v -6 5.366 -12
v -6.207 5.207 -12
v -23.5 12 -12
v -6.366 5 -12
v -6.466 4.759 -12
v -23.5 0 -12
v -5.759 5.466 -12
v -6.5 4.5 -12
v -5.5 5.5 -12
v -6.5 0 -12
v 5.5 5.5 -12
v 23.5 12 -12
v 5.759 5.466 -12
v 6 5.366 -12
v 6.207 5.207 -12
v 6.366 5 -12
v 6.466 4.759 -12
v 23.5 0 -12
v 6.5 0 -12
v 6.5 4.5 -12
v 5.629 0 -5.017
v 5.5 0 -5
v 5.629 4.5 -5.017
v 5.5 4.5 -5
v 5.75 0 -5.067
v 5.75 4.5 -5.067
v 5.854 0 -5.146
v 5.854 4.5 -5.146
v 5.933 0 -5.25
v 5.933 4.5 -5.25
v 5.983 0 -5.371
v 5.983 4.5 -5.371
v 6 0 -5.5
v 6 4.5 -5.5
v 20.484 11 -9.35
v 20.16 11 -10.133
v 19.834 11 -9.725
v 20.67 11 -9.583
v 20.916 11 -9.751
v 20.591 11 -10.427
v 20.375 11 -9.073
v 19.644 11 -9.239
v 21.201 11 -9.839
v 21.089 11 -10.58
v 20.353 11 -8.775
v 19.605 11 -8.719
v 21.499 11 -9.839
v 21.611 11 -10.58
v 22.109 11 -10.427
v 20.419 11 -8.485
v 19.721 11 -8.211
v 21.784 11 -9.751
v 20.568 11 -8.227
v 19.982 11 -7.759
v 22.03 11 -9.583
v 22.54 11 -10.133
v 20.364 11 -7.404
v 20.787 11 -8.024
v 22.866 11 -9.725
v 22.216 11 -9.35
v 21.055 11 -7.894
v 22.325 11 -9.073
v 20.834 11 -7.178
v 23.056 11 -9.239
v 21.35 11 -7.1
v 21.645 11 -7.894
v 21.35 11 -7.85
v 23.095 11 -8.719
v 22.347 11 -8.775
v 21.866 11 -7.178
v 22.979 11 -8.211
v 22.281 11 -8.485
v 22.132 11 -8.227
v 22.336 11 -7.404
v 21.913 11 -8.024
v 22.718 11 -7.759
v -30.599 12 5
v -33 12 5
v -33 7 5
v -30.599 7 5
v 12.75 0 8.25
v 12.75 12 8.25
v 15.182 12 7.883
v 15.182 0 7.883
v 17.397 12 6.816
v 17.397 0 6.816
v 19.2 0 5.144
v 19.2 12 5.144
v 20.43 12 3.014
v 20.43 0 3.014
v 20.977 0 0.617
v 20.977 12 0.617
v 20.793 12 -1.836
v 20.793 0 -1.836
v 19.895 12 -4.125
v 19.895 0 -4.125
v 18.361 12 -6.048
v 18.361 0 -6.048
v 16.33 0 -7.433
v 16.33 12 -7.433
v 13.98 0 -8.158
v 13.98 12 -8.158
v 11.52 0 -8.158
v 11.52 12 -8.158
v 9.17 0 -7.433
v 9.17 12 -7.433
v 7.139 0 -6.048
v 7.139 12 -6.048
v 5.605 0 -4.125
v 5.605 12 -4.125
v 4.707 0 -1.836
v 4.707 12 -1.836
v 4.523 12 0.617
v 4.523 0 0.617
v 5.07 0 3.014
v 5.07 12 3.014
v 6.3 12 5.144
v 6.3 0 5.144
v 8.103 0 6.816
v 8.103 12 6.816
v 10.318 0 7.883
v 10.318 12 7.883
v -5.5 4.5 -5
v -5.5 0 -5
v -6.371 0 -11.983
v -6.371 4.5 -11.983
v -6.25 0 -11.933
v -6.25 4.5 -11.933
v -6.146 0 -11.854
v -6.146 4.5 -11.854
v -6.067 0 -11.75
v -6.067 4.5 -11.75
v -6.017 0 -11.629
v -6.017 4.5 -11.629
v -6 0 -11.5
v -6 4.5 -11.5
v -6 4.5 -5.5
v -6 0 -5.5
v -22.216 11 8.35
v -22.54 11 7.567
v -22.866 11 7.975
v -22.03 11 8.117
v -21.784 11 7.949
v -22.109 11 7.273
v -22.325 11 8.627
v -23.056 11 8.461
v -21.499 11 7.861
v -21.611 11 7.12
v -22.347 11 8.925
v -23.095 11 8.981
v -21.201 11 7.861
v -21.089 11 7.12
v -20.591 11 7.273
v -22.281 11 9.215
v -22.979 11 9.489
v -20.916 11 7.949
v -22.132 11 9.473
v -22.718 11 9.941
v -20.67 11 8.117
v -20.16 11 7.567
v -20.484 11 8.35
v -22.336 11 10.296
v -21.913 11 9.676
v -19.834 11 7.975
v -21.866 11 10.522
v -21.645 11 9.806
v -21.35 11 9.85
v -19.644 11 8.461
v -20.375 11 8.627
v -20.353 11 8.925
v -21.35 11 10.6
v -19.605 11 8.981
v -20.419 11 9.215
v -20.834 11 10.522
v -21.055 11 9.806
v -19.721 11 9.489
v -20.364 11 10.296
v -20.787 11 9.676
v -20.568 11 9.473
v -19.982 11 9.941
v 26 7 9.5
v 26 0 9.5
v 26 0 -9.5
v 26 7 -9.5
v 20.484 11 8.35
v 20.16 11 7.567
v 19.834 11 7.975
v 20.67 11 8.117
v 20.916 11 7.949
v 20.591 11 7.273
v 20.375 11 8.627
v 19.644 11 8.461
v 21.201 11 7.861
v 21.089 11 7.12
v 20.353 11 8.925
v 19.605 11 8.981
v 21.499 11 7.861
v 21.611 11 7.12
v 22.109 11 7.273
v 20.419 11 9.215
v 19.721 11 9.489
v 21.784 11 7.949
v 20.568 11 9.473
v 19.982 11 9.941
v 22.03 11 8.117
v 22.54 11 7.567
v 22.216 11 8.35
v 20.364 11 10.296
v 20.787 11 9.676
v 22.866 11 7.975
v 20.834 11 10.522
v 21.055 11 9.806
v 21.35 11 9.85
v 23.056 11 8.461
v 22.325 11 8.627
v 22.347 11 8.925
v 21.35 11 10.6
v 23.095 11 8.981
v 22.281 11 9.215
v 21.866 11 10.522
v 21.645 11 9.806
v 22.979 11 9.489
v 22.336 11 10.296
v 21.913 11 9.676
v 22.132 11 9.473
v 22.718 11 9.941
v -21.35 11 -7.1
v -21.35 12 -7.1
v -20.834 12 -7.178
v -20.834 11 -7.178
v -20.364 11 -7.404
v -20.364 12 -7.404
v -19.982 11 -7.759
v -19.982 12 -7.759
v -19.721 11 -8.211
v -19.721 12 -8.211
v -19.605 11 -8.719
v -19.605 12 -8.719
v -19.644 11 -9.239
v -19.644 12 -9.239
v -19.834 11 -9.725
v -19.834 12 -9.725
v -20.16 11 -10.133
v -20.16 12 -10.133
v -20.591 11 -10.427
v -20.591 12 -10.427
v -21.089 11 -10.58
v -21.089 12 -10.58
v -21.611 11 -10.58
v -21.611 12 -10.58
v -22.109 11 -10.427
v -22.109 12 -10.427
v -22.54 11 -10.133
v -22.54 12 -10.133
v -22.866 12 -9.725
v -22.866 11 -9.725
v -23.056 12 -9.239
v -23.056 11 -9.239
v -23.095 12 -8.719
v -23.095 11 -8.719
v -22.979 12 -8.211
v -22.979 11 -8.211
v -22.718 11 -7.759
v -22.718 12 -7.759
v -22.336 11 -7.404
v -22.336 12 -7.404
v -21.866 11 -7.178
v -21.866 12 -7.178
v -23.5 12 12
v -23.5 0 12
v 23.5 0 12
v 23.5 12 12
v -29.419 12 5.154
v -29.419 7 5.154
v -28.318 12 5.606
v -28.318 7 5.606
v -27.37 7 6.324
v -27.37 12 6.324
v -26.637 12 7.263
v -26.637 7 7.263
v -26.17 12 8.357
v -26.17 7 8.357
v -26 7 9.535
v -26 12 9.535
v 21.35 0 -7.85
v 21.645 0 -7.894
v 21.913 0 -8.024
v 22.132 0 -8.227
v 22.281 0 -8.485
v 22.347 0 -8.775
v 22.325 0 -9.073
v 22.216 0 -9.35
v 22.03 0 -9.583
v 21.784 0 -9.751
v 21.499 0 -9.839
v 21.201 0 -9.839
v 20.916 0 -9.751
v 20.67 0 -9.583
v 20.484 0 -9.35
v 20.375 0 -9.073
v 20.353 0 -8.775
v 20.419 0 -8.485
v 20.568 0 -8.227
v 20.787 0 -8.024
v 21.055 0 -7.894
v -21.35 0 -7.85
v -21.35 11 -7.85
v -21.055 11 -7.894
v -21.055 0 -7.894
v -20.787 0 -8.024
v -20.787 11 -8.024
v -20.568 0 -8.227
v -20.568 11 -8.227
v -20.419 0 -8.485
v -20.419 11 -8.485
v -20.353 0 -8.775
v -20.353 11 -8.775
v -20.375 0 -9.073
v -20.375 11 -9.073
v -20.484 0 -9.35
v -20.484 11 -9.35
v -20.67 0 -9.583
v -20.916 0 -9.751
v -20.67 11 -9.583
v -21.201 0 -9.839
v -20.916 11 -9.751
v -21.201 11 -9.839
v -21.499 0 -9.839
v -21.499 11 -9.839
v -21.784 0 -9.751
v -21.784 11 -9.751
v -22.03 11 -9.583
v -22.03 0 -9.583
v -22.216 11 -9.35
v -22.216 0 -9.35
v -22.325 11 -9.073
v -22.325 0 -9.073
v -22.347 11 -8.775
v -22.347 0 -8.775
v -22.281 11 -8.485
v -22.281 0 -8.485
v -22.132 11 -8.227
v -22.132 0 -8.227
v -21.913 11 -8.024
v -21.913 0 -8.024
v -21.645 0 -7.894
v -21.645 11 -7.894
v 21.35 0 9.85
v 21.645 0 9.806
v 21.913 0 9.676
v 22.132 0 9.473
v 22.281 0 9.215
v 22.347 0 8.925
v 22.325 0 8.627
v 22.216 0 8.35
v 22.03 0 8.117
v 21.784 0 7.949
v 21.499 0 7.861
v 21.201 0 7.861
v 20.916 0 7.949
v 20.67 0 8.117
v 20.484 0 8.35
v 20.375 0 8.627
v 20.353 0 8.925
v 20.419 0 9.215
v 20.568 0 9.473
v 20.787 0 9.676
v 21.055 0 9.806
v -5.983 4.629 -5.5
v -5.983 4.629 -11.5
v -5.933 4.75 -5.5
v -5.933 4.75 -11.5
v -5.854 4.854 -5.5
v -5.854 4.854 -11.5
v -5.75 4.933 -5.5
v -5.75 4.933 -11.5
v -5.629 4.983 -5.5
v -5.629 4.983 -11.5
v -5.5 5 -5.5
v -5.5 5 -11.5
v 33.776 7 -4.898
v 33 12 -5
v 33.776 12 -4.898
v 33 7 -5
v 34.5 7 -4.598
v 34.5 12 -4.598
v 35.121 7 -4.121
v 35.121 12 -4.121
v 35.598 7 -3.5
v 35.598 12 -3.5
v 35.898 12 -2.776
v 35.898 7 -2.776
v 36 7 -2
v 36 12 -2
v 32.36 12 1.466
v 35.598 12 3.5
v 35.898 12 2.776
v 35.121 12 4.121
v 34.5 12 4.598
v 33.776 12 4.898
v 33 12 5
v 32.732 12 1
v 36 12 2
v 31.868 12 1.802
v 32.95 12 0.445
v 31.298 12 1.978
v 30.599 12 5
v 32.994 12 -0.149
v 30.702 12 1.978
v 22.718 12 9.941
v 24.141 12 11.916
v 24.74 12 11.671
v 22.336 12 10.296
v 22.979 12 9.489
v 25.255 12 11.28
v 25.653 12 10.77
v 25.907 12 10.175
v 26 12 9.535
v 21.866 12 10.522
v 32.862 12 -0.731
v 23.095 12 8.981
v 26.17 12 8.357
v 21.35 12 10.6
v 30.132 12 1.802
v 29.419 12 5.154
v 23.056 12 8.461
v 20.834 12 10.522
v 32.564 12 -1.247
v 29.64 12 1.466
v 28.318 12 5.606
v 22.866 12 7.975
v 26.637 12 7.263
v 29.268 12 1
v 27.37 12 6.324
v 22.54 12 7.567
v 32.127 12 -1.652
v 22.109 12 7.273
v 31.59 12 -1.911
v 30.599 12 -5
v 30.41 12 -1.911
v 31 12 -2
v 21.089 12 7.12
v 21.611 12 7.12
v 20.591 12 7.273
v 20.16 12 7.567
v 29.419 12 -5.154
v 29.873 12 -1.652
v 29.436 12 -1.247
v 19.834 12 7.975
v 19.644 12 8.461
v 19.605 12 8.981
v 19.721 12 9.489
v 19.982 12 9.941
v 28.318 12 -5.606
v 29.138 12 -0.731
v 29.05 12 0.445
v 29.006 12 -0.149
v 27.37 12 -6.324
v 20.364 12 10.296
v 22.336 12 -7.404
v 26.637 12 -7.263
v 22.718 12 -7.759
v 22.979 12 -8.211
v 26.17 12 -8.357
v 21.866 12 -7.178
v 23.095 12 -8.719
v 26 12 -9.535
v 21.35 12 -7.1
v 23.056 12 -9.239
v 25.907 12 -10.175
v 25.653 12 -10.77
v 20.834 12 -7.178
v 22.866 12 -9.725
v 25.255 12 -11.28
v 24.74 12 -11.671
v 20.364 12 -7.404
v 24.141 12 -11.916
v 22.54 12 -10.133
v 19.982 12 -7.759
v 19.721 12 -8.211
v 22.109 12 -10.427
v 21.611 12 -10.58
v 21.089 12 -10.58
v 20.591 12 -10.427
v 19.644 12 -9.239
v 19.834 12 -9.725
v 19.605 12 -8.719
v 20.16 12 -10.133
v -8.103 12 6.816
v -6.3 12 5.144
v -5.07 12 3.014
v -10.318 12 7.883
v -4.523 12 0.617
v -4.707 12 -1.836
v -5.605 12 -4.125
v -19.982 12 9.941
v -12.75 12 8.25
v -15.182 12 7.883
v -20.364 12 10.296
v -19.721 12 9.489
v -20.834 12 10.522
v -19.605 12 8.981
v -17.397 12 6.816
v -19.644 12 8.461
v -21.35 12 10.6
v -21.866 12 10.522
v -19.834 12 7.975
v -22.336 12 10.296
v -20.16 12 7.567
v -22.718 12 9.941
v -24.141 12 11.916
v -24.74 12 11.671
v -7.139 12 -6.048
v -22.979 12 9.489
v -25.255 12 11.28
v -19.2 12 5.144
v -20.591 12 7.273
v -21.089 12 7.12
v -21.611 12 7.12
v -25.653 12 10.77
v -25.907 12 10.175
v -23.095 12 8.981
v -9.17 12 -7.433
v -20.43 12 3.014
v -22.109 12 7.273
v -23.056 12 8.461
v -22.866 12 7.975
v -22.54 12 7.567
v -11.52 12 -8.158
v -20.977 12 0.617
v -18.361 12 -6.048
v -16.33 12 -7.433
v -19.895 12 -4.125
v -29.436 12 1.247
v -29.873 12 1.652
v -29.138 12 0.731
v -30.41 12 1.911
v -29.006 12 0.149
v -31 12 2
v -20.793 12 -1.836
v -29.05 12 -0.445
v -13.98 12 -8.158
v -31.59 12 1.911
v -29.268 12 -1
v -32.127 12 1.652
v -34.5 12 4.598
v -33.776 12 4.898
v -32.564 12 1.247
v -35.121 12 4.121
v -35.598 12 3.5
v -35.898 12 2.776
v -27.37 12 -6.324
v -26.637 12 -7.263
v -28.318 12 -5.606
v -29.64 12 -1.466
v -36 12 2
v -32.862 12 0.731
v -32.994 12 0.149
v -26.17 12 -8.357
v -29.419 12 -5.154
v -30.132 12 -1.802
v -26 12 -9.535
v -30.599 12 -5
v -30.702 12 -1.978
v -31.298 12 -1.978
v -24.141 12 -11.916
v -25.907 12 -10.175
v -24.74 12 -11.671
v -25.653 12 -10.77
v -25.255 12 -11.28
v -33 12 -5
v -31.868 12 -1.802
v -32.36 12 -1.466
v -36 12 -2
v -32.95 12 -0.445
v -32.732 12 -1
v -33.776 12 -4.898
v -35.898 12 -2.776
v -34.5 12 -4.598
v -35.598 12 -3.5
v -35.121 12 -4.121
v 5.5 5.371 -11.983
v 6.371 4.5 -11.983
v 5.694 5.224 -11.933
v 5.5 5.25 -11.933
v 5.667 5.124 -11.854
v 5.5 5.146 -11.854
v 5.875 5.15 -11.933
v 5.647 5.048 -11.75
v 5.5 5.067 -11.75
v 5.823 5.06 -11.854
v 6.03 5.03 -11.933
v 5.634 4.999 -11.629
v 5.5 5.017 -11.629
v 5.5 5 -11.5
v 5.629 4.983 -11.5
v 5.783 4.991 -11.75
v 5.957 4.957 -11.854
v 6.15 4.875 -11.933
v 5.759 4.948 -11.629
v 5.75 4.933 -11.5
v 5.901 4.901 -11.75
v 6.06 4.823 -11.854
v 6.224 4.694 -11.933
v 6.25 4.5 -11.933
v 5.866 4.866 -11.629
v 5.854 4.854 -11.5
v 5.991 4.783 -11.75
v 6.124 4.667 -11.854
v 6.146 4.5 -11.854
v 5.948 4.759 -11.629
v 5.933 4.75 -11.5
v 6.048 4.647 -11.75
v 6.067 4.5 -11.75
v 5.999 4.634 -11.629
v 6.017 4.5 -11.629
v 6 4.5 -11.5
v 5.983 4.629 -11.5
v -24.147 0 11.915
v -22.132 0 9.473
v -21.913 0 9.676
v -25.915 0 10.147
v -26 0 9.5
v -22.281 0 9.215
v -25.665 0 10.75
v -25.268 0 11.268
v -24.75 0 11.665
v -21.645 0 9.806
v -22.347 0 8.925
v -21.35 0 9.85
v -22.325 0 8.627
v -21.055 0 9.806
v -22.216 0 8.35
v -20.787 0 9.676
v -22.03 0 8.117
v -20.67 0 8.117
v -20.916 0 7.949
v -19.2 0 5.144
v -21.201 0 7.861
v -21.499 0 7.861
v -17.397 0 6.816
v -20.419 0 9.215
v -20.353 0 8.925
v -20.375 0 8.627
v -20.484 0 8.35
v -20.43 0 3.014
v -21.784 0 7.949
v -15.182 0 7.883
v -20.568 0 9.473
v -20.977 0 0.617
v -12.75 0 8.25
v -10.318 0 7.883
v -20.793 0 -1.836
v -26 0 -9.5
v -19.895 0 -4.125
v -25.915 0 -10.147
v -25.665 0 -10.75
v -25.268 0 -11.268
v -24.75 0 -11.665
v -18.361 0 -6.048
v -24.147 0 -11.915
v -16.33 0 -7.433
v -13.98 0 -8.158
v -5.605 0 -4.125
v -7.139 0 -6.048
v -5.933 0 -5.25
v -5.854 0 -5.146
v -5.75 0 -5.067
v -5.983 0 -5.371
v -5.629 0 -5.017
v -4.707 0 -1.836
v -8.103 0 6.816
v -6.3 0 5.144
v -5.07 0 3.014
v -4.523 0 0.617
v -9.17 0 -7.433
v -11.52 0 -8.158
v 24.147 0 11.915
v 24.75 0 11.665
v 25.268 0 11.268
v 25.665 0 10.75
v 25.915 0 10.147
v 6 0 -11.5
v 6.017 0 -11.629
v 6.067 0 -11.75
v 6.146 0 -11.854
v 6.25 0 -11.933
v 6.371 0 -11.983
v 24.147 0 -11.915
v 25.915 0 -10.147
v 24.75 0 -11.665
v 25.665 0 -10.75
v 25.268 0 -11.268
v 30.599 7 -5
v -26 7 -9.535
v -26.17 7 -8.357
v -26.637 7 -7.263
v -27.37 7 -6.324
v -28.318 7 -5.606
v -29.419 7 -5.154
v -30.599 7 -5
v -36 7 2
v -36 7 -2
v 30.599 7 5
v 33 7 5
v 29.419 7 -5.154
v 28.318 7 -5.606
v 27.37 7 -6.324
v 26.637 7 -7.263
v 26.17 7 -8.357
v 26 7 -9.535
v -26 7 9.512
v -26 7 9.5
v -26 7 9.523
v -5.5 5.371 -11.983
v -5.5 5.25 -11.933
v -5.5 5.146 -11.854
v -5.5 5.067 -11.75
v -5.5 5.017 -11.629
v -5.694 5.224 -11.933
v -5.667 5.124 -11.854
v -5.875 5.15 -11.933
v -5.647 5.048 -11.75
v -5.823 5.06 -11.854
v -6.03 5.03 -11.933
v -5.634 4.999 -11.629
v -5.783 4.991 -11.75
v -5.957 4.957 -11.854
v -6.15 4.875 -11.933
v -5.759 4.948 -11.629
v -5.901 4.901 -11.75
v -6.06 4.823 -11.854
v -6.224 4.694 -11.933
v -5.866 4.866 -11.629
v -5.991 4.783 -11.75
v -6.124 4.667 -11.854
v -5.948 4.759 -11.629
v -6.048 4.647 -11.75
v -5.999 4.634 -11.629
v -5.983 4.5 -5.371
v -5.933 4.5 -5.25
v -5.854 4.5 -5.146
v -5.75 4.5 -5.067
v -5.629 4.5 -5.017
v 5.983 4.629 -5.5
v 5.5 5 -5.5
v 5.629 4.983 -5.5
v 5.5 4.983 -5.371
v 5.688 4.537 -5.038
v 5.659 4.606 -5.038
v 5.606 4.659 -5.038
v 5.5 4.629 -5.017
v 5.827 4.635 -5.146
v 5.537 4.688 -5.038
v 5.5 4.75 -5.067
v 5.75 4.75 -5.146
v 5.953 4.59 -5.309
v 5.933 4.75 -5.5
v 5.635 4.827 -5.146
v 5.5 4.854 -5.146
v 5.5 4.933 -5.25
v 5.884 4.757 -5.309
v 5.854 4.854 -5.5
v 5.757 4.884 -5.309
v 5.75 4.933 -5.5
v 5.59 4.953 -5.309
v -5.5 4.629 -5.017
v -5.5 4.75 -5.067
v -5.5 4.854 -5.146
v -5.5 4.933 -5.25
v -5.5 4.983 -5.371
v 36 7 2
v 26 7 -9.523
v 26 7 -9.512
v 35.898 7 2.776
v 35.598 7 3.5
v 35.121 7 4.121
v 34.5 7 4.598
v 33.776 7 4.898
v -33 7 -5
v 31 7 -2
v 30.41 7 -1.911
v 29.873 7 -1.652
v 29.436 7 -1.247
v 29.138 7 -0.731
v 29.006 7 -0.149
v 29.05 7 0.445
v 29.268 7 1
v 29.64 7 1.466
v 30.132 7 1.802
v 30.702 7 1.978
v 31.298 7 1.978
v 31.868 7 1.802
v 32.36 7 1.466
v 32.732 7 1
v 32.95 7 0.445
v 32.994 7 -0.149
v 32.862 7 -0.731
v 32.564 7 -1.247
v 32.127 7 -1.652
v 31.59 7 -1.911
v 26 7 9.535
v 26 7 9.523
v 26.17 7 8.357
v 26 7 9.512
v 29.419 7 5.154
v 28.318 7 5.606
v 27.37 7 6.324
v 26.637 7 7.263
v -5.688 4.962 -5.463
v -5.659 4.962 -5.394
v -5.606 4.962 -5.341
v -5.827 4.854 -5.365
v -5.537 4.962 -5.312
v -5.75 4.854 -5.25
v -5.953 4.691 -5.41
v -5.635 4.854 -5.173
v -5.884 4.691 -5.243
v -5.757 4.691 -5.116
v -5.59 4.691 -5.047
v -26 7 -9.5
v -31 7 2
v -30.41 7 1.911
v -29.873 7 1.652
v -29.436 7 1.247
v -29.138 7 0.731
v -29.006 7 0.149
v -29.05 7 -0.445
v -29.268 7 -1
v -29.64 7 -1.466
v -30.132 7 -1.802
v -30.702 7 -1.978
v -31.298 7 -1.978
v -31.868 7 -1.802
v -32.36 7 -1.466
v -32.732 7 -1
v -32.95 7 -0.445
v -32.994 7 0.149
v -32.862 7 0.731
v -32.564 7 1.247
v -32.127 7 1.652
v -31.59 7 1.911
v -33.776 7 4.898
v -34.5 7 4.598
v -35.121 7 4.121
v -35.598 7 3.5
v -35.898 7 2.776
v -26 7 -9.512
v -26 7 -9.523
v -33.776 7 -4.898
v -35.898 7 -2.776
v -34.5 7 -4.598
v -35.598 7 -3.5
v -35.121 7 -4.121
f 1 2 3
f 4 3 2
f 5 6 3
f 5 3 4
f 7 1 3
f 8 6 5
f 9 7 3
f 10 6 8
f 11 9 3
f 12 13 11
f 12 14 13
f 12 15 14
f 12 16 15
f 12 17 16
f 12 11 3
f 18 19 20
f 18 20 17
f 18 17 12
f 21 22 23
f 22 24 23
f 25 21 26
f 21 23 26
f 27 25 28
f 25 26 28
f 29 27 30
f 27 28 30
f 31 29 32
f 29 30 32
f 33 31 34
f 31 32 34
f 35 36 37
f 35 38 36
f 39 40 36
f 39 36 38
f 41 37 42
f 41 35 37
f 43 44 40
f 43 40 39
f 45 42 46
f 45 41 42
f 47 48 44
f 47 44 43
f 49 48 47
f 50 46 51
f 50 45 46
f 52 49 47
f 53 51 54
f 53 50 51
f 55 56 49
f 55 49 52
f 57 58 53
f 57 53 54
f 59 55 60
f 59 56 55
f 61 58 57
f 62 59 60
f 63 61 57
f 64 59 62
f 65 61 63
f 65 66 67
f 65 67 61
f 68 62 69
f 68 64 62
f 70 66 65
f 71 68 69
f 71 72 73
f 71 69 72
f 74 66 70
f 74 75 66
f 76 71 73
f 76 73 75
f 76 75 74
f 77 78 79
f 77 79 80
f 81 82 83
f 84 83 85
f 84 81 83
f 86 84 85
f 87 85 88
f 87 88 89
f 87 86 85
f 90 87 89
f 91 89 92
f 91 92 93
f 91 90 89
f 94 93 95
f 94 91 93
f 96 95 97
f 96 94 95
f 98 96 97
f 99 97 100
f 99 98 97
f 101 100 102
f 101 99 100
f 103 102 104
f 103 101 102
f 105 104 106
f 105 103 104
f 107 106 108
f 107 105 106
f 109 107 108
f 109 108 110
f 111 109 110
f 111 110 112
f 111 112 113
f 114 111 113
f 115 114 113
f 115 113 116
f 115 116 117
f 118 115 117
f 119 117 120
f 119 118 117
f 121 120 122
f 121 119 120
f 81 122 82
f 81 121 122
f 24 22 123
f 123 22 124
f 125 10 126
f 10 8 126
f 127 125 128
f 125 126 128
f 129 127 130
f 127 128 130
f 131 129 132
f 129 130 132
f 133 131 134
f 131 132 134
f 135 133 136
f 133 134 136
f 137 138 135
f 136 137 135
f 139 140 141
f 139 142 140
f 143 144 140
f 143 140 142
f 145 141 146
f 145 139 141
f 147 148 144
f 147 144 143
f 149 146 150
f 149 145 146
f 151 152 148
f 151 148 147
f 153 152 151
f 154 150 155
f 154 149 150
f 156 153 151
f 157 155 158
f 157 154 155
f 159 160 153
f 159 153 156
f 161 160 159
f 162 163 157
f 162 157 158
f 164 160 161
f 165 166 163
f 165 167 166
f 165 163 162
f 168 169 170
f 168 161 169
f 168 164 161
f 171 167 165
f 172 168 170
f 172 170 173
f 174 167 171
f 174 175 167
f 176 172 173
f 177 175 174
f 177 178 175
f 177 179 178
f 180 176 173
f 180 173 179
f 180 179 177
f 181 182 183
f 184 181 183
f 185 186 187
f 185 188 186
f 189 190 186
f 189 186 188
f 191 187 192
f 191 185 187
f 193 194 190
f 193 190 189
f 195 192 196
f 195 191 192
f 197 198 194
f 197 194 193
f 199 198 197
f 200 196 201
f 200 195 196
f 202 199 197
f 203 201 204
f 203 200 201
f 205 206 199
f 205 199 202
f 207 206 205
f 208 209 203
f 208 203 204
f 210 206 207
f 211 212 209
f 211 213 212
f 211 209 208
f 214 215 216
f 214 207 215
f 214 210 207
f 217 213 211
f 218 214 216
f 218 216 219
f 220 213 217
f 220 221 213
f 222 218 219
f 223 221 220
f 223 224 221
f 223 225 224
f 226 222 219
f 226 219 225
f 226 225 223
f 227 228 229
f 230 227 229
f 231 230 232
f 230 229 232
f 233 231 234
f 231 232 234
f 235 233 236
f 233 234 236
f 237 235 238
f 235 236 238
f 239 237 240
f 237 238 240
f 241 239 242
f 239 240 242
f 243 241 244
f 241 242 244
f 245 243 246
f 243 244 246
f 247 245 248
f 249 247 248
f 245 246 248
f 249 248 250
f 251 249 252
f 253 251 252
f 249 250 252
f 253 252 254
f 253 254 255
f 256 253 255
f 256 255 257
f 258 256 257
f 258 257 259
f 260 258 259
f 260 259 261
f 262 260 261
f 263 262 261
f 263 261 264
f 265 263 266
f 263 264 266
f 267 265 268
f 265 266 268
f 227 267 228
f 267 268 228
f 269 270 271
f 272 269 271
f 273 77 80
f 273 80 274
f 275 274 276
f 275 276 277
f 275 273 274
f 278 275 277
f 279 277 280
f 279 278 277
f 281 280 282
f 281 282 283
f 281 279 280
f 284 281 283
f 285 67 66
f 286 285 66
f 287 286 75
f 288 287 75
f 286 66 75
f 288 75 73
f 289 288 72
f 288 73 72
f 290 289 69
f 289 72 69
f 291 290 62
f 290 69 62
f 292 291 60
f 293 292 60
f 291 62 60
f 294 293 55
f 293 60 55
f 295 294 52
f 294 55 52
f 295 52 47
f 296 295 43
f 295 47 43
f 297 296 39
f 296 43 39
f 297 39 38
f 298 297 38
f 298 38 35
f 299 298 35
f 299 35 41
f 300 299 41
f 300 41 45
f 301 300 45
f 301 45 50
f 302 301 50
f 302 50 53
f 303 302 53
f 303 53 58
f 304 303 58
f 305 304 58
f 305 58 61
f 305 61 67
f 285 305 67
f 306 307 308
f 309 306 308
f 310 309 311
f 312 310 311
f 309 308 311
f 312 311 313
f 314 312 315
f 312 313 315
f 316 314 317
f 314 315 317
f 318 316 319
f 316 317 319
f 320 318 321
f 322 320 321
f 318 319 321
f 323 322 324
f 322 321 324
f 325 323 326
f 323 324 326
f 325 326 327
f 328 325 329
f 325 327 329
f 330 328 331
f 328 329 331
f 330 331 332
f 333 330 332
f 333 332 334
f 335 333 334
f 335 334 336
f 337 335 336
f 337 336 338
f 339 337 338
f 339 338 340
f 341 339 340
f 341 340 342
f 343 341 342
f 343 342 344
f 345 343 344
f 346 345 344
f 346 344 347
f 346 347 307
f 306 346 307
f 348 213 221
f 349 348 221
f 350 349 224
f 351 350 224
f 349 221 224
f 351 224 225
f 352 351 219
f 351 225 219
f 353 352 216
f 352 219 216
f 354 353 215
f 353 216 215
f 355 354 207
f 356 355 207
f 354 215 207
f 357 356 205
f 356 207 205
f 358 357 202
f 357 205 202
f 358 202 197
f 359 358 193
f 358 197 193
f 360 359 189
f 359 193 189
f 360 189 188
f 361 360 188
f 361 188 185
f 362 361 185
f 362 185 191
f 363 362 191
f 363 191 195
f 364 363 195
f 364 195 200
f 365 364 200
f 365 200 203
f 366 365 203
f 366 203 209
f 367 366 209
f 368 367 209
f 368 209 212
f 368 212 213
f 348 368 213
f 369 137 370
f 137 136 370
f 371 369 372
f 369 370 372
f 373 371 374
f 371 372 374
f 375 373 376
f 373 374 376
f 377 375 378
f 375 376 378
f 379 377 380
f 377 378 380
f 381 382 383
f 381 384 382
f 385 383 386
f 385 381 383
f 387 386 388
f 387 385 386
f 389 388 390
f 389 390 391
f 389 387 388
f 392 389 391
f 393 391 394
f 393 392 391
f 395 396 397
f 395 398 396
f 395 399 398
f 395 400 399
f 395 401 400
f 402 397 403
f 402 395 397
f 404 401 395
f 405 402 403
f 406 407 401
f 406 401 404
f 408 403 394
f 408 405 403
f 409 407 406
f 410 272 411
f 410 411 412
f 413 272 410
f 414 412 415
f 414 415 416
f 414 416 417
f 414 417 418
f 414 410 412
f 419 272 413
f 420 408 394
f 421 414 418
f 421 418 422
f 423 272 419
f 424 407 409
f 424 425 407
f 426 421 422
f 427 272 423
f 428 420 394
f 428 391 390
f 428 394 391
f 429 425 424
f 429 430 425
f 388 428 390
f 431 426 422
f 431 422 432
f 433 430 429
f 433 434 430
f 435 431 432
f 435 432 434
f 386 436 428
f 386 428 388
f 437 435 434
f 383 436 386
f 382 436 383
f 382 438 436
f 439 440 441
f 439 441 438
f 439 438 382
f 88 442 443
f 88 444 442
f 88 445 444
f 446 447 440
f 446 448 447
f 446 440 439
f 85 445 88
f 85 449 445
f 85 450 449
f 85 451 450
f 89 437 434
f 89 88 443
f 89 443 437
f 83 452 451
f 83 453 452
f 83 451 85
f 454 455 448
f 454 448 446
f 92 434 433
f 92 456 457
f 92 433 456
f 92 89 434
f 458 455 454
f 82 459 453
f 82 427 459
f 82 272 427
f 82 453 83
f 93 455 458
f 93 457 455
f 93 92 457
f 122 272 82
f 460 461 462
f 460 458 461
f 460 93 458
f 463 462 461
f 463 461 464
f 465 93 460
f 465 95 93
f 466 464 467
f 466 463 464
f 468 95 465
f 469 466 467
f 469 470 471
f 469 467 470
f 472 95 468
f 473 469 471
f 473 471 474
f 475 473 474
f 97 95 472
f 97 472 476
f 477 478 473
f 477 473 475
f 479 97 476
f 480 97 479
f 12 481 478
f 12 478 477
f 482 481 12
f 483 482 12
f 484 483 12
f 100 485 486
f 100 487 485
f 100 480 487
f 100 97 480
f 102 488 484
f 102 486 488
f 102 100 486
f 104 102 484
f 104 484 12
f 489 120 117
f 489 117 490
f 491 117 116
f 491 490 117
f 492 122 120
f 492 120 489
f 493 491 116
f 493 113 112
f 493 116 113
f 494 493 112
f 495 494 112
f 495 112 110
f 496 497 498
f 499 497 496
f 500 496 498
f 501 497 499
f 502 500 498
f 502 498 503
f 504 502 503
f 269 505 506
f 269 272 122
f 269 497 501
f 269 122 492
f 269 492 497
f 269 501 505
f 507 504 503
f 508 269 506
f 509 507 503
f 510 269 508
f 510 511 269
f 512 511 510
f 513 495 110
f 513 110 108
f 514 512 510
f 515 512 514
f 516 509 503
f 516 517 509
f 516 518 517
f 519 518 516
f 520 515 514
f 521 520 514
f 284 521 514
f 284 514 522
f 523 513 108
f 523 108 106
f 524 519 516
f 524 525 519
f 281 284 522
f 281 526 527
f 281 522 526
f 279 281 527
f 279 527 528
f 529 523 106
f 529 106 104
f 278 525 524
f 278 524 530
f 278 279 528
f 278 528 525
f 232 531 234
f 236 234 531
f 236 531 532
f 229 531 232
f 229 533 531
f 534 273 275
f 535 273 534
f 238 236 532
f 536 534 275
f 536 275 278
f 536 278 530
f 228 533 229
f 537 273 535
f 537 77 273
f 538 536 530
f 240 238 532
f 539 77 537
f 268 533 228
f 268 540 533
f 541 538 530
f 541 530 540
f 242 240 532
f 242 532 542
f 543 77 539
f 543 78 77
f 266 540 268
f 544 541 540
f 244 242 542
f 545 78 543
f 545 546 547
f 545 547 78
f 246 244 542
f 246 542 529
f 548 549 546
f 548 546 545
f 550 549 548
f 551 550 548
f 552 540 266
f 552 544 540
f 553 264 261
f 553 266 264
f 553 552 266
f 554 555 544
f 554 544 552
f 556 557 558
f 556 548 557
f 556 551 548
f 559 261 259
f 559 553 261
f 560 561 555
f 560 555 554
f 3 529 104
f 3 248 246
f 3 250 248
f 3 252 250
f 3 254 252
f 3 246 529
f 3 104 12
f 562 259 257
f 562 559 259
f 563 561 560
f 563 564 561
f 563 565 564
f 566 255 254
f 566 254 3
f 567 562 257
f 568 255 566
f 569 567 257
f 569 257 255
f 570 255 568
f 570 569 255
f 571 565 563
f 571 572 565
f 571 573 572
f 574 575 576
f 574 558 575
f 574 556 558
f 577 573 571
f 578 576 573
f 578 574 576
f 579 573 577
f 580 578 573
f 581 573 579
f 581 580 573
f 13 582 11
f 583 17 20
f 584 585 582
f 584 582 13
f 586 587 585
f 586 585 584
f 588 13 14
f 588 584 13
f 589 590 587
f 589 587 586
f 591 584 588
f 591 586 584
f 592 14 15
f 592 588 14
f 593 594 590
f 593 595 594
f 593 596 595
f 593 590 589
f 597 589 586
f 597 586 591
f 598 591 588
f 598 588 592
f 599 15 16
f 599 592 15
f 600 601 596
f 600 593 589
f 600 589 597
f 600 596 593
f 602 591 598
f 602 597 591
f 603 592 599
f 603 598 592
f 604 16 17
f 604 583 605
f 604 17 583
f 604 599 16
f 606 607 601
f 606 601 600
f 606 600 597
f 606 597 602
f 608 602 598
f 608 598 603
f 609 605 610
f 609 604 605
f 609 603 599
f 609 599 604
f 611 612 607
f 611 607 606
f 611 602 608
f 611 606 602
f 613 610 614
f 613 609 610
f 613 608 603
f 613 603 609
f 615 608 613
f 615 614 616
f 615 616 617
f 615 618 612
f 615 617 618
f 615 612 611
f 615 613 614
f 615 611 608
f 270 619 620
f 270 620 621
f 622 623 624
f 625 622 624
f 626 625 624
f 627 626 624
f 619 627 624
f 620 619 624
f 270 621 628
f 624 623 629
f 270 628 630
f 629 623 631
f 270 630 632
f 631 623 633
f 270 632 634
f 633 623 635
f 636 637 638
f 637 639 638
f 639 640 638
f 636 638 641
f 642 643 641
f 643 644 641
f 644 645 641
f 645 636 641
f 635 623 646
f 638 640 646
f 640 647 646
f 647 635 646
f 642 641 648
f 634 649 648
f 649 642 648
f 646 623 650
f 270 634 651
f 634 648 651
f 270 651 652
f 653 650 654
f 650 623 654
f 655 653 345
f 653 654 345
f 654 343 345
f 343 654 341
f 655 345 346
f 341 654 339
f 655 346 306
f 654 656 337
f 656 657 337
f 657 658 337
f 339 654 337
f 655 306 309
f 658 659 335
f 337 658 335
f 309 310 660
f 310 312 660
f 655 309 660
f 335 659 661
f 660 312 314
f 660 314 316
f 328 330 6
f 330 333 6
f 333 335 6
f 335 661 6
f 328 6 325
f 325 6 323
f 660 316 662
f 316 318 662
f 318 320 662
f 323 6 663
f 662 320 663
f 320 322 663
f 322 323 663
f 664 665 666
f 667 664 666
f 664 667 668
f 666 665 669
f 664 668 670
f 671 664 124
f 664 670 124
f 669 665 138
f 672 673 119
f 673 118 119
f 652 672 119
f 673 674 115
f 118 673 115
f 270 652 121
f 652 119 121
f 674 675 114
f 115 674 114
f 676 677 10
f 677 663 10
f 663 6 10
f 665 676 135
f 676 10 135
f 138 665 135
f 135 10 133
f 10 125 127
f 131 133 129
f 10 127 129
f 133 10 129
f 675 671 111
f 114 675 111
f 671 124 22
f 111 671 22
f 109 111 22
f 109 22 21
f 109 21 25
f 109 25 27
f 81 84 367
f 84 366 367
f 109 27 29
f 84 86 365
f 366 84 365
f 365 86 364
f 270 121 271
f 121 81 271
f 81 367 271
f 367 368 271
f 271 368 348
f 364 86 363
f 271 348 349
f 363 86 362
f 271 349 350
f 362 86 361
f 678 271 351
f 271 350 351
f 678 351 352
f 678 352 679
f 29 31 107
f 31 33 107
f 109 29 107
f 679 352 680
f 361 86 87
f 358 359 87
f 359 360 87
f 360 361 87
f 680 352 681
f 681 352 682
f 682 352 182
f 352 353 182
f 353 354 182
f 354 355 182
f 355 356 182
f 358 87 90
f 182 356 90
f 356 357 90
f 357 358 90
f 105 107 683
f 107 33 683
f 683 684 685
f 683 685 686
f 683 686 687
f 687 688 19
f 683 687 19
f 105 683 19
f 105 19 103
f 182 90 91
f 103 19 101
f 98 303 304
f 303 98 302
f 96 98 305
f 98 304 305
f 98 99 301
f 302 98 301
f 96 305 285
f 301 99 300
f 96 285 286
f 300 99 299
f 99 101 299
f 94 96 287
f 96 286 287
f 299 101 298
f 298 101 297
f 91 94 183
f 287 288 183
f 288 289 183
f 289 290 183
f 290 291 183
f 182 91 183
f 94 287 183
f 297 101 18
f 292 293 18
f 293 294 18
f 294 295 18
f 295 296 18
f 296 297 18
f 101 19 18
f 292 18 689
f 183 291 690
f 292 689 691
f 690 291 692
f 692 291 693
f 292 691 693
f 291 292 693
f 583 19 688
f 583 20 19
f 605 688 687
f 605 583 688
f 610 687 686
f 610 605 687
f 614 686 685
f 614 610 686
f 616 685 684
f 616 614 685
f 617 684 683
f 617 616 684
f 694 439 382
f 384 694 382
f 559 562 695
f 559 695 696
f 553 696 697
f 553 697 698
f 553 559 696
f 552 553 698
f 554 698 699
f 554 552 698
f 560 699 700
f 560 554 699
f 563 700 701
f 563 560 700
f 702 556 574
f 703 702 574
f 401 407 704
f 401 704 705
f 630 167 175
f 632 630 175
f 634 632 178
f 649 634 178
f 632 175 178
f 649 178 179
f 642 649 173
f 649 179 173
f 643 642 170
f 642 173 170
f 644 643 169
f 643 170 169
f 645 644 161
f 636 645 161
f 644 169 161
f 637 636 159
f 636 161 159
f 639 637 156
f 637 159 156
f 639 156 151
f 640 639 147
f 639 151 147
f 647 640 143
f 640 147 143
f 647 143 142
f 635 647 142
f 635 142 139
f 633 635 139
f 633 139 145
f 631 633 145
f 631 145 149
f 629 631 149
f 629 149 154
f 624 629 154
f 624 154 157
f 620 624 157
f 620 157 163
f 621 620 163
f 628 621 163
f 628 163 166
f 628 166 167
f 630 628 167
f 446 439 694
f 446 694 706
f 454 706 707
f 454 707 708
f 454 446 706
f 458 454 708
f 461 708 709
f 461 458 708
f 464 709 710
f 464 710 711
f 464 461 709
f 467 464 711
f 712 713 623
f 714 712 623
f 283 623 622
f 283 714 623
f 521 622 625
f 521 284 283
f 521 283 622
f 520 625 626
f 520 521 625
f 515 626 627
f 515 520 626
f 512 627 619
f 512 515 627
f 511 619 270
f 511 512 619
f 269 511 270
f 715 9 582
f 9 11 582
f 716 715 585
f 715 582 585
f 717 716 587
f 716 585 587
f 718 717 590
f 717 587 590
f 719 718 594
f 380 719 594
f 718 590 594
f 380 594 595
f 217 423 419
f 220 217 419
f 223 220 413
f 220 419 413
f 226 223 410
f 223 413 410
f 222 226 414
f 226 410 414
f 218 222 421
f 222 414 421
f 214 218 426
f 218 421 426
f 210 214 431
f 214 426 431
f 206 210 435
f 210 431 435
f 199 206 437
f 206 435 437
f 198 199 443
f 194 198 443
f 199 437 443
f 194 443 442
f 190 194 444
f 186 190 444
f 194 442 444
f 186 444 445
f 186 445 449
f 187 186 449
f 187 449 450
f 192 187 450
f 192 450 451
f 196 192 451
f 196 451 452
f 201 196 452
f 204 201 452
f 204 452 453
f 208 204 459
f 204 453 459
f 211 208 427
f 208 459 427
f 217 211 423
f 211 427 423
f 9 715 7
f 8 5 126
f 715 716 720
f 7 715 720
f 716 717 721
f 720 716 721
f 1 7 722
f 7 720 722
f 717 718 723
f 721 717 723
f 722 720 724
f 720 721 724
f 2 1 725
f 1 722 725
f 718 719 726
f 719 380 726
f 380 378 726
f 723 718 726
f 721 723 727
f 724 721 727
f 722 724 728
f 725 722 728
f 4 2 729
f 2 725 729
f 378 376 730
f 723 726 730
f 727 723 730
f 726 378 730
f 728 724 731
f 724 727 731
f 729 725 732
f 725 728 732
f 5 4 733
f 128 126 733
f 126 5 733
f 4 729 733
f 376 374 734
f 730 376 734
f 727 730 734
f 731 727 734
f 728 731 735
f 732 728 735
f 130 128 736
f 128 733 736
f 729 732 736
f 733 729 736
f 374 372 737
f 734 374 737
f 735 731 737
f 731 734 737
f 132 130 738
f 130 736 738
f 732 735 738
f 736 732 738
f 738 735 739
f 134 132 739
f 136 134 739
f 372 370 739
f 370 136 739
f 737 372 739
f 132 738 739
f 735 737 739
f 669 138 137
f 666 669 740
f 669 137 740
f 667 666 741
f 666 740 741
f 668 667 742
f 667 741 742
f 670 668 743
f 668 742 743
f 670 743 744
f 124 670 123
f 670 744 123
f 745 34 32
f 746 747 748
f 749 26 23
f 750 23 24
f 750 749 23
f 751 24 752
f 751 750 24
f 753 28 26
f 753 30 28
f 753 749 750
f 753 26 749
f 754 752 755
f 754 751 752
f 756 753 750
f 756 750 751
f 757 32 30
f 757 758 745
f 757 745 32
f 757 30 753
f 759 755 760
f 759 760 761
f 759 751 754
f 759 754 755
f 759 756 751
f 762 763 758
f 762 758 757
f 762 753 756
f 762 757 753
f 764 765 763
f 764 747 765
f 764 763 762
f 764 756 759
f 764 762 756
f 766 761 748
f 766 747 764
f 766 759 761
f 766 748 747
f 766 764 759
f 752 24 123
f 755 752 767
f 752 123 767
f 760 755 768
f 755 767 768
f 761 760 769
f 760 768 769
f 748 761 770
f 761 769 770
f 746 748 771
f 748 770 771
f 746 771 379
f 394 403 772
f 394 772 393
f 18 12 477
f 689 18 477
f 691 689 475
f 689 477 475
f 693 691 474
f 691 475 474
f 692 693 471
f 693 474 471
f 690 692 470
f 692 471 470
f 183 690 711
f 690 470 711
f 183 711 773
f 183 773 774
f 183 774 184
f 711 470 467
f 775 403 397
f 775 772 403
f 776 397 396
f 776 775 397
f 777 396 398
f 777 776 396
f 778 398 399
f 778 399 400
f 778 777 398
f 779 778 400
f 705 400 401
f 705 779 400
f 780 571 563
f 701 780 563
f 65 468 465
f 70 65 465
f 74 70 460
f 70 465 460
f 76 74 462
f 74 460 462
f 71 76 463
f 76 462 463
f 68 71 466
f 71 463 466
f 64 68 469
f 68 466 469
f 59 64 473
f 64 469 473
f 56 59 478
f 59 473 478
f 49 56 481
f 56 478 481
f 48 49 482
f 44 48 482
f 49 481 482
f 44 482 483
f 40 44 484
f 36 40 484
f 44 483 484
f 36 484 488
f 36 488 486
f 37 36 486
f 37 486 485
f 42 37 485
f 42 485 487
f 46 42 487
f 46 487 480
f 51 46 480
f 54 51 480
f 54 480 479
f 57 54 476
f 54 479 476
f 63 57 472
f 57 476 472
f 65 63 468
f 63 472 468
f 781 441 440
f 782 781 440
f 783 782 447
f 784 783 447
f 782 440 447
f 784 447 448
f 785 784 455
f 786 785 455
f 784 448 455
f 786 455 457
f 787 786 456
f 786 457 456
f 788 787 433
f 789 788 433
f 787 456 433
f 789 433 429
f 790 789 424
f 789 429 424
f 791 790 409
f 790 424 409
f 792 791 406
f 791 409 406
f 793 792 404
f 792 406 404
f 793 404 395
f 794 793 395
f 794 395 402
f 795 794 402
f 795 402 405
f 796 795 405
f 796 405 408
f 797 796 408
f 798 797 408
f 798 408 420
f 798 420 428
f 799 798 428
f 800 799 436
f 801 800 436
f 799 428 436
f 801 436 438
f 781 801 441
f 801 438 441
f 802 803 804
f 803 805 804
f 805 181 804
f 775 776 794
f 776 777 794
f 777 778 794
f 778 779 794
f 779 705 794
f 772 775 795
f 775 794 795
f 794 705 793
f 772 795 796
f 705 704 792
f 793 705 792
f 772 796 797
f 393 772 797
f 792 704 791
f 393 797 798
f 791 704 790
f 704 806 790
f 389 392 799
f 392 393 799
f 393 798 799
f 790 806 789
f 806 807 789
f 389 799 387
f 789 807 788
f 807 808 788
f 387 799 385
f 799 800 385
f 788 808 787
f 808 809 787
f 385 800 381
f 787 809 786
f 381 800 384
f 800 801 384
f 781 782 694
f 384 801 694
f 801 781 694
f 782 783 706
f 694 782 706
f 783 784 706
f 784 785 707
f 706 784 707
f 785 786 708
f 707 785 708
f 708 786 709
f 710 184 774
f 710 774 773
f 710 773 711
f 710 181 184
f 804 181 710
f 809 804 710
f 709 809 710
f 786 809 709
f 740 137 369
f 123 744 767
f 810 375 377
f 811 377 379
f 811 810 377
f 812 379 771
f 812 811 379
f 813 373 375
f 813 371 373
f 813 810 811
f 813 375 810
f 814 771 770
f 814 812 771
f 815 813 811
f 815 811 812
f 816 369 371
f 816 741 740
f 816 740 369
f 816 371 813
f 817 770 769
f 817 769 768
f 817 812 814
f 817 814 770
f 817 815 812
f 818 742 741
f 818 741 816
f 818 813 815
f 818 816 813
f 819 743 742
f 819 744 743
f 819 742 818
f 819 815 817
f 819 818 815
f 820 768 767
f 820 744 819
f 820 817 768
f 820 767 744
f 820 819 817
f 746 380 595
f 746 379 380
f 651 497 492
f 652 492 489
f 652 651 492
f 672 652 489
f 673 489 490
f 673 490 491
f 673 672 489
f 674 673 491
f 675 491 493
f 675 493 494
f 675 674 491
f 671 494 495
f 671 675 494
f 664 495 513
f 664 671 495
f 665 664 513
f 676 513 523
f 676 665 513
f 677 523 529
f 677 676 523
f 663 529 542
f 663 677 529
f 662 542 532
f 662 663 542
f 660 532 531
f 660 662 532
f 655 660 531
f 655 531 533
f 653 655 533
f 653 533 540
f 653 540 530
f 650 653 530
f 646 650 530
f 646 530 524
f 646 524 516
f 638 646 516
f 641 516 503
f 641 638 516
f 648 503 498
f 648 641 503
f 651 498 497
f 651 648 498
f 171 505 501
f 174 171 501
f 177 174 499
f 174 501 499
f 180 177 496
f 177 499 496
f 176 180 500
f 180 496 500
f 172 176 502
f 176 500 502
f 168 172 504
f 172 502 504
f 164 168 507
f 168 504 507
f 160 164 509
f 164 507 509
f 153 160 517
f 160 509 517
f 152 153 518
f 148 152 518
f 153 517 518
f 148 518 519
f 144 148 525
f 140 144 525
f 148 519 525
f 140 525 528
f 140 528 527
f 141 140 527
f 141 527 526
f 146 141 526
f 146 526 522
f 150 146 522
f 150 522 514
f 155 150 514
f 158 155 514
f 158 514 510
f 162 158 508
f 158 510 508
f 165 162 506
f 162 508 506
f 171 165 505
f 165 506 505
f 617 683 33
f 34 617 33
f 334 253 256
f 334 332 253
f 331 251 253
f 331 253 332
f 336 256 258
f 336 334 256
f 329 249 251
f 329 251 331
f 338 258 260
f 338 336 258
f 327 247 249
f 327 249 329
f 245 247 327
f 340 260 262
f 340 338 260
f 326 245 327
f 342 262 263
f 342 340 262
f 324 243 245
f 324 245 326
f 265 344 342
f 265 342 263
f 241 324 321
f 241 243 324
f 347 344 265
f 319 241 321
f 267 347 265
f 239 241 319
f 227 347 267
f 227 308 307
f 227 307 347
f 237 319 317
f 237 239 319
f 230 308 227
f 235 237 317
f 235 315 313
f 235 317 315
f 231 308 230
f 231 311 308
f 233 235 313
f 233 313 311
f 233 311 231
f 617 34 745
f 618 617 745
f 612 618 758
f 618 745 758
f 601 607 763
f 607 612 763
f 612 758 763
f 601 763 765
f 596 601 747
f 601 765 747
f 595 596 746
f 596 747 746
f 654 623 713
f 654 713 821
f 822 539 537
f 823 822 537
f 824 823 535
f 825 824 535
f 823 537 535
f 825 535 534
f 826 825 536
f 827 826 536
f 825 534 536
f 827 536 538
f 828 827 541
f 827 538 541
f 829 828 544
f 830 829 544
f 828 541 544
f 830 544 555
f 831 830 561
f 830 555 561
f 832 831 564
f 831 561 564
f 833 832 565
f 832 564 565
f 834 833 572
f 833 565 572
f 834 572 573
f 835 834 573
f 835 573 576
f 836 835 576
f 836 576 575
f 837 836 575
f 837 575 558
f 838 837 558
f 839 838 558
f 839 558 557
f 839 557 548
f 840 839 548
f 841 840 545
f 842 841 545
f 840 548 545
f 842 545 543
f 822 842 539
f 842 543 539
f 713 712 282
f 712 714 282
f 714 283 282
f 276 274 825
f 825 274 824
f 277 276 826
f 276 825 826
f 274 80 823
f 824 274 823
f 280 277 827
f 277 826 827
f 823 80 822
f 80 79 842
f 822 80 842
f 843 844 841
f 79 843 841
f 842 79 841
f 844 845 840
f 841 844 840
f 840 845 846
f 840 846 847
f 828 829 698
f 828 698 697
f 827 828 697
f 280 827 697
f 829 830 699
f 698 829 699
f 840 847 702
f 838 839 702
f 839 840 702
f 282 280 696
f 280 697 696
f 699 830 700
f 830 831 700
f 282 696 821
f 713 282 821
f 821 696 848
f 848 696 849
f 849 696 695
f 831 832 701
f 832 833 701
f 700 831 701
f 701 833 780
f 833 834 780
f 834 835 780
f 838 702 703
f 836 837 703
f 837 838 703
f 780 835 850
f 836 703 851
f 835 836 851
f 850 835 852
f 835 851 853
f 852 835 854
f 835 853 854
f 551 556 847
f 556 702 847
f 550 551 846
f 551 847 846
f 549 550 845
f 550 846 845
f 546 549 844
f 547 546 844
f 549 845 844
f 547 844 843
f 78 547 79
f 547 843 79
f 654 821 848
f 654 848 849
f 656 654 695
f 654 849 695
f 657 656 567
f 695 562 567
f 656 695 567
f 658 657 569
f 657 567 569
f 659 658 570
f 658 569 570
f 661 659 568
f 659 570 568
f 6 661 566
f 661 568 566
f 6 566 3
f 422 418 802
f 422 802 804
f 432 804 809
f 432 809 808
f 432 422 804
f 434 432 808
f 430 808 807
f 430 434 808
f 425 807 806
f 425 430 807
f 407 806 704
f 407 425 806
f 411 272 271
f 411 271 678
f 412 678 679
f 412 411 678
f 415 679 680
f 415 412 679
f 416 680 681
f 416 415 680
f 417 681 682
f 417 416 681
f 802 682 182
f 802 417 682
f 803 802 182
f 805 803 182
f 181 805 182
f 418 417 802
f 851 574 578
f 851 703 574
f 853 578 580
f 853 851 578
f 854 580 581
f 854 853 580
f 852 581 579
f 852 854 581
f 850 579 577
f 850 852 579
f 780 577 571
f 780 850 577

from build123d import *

# Parameters (mm, degrees)
SKETCH1_W           = 52
SKETCH1_H           = 24
SKETCH1_R           = 8.25
BOSS_EXTRUDE1_DEPTH = 12
SKETCH2_R           = 1
CUT_EXTRUDE1_DEPTH  = 32.048349393
SKETCH3_R           = 1.75
CUT_EXTRUDE2_DEPTH  = 1
FILLET1_R           = 2.5
CUT_EXTRUDE3_DEPTH  = 5
FILLET2_R           = 0.5
SKETCH6_W           = 10
SKETCH6_H           = 10
SKETCH6_R           = 2
BOSS_EXTRUDE2_DEPTH = 5
FILLET3_R           = 4.6
FILLET4_R           = 3


with BuildPart() as part:
    # Sketch1 → Boss-Extrude1 (new body)
    with BuildSketch(Plane(origin=(0, 0, 0), x_dir=(1, 0, 0), z_dir=(0, 1, 0))):
        Rectangle(SKETCH1_W, SKETCH1_H)
        with Locations(Location((12.75, 0, 0), (0, 0, 270))):
            Circle(SKETCH1_R, mode=Mode.SUBTRACT)
        with Locations(Location((-12.75, 0, 0), (0, 0, 270))):
            Circle(SKETCH1_R, mode=Mode.SUBTRACT)
    extrude(amount=BOSS_EXTRUDE1_DEPTH)

    # Sketch2 → Cut-Extrude1 (cut, through all)
    with BuildSketch(Plane(origin=(0, 12, 0), x_dir=(1, 0, 0), z_dir=(0, 1, 0))):
        with Locations(Location((-21.35, 8.85, 0), (0, 0, 270))):
            Circle(SKETCH2_R)
        with Locations(Location((21.35, 8.85, 0), (0, 0, 270))):
            Circle(SKETCH2_R)
        with Locations(Location((21.35, -8.85, 0), (0, 0, 270))):
            Circle(SKETCH2_R)
        with Locations(Location((-21.35, -8.85, 0), (0, 0, 270))):
            Circle(SKETCH2_R)
    extrude(amount=-CUT_EXTRUDE1_DEPTH, mode=Mode.SUBTRACT)

    # Sketch3 → Cut-Extrude2 (cut)
    with BuildSketch(Plane(origin=(0, 12, 0), x_dir=(1, 0, 0), z_dir=(0, 1, 0))):
        with Locations(Location((-21.35, 8.85, 0), (0, 0, 270))):
            Circle(SKETCH3_R)
        with Locations(Location((21.35, 8.85, 0), (0, 0, 270))):
            Circle(SKETCH3_R)
        with Locations(Location((21.35, -8.85, 0), (0, 0, 270))):
            Circle(SKETCH3_R)
        with Locations(Location((-21.35, -8.85, 0), (0, 0, 270))):
            Circle(SKETCH3_R)
    extrude(amount=-CUT_EXTRUDE2_DEPTH, mode=Mode.SUBTRACT)

    # Fillet1
    fillet1_edges = [part.edges().sort_by_distance(p)[0] for p in [
        (26, 6, 12),
        (-26, 6, 12),
        (-26, 6, -12),
        (26, 6, -12),
    ]]
    fillet(fillet1_edges, radius=FILLET1_R)

    # Sketch4 → Cut-Extrude3 (cut)
    with BuildSketch(Plane.XZ):
        Polygon((-6, -5), (-6, -12), (6, -12), (6, -5), (0, -5), align=None)
    extrude(amount=-CUT_EXTRUDE3_DEPTH, mode=Mode.SUBTRACT)

    # Fillet2
    fillet2_edges = [part.edges().sort_by_distance(p)[0] for p in [
        (0, 5, -12),
        (6, 2.5, -12),
        (-6, 2.5, -12),
        (-6, 2.5, -5),
        (6, 5, -8.5),
        (6, 2.5, -5),
        (-6, 5, -8.5),
        (0, 5, -5),
    ]]
    fillet(fillet2_edges, radius=FILLET2_R)

    # Sketch6 → Boss-Extrude2 (add)
    # profile 1 of 2: a face of its own
    with BuildSketch(Plane(origin=(0, 12, 0), x_dir=(1, 0, 0), z_dir=(0, 1, 0))):
        with Locations((-31, 0)):
            Rectangle(SKETCH6_W, SKETCH6_H)
        with Locations(Location((-31, 0, 0), (0, 0, 270))):
            Circle(SKETCH6_R, mode=Mode.SUBTRACT)
    # profile 2 of 2: a face of its own
    with BuildSketch(Plane(origin=(0, 12, 0), x_dir=(1, 0, 0), z_dir=(0, 1, 0))):
        with Locations((31, 0)):
            Rectangle(SKETCH6_W, SKETCH6_H)
        with Locations(Location((31, 0, 0), (0, 0, 90))):
            Circle(SKETCH6_R, mode=Mode.SUBTRACT)
    extrude(amount=-BOSS_EXTRUDE2_DEPTH)

    # Fillet3
    # the kernel refuses this fillet: 4.6 mm, written as the material it adds along each edge
    with BuildSketch(Plane(origin=(26, 12, 5), x_dir=(-5.467859312132584e-05, 0, 0.9999999985051258), z_dir=(0, -1, 0)), Plane(origin=(-26, 12, -5), x_dir=(5.467859312132586e-05, 0, -0.9999999985051258), z_dir=(0, -1, 0))) as fillet3_piece_1:
        with BuildLine():
            CenterArc((4.59974851, -4.599547254), FILLET3_R, 90.80387664, 89.192990507)
            Line((-0.000251483, -4.599295733), (-0.460251482, -4.599270581))
            Line((-0.460251482, -4.599270581), (-0.459999999, 2.5152e-05))
            Line((-0.459999999, 2.5152e-05), (2.5152e-05, 0.459999999))
            ThreePointArc((2.5152e-05, 0.459999999), (4.500025145, 0.459753946), (4.528757551, 0.459954725))
            Line((4.528757551, 0.459954725), (4.535211274, 0))
        make_face()
    extrude(amount=5)
    with BuildSketch(Plane(origin=(-26, 12, 5), x_dir=(5.467859312289258e-05, 0, 0.9999999985051258), z_dir=(0, -1, 0)), Plane(origin=(26, 12, -5), x_dir=(-5.467859312132581e-05, 0, -0.9999999985051258), z_dir=(0, -1, 0))) as fillet3_piece_2:
        with BuildLine():
            CenterArc((4.59974851, 4.599547254), FILLET3_R, 180.003132853, 89.192990507)
            Line((-0.000251483, 4.599295733), (-0.460251482, 4.599270581))
            Line((-0.460251482, 4.599270581), (-0.459999999, -2.5152e-05))
            Line((-0.459999999, -2.5152e-05), (2.5152e-05, -0.459999999))
            ThreePointArc((2.5152e-05, -0.459999999), (4.500025145, -0.459753946), (4.528757551, -0.459954725))
            Line((4.528757551, -0.459954725), (4.535211274, 0))
        make_face()
    extrude(amount=5)

    # Fillet4
    fillet4_edges = [part.edges().sort_by_distance(p)[0] for p in [
        (-36, 9.5, 5),
        (-36, 9.5, -5),
        (36, 9.5, -5),
        (36, 9.5, 5),
    ]]
    fillet(fillet4_edges, radius=FILLET4_R)


solid = part.part
